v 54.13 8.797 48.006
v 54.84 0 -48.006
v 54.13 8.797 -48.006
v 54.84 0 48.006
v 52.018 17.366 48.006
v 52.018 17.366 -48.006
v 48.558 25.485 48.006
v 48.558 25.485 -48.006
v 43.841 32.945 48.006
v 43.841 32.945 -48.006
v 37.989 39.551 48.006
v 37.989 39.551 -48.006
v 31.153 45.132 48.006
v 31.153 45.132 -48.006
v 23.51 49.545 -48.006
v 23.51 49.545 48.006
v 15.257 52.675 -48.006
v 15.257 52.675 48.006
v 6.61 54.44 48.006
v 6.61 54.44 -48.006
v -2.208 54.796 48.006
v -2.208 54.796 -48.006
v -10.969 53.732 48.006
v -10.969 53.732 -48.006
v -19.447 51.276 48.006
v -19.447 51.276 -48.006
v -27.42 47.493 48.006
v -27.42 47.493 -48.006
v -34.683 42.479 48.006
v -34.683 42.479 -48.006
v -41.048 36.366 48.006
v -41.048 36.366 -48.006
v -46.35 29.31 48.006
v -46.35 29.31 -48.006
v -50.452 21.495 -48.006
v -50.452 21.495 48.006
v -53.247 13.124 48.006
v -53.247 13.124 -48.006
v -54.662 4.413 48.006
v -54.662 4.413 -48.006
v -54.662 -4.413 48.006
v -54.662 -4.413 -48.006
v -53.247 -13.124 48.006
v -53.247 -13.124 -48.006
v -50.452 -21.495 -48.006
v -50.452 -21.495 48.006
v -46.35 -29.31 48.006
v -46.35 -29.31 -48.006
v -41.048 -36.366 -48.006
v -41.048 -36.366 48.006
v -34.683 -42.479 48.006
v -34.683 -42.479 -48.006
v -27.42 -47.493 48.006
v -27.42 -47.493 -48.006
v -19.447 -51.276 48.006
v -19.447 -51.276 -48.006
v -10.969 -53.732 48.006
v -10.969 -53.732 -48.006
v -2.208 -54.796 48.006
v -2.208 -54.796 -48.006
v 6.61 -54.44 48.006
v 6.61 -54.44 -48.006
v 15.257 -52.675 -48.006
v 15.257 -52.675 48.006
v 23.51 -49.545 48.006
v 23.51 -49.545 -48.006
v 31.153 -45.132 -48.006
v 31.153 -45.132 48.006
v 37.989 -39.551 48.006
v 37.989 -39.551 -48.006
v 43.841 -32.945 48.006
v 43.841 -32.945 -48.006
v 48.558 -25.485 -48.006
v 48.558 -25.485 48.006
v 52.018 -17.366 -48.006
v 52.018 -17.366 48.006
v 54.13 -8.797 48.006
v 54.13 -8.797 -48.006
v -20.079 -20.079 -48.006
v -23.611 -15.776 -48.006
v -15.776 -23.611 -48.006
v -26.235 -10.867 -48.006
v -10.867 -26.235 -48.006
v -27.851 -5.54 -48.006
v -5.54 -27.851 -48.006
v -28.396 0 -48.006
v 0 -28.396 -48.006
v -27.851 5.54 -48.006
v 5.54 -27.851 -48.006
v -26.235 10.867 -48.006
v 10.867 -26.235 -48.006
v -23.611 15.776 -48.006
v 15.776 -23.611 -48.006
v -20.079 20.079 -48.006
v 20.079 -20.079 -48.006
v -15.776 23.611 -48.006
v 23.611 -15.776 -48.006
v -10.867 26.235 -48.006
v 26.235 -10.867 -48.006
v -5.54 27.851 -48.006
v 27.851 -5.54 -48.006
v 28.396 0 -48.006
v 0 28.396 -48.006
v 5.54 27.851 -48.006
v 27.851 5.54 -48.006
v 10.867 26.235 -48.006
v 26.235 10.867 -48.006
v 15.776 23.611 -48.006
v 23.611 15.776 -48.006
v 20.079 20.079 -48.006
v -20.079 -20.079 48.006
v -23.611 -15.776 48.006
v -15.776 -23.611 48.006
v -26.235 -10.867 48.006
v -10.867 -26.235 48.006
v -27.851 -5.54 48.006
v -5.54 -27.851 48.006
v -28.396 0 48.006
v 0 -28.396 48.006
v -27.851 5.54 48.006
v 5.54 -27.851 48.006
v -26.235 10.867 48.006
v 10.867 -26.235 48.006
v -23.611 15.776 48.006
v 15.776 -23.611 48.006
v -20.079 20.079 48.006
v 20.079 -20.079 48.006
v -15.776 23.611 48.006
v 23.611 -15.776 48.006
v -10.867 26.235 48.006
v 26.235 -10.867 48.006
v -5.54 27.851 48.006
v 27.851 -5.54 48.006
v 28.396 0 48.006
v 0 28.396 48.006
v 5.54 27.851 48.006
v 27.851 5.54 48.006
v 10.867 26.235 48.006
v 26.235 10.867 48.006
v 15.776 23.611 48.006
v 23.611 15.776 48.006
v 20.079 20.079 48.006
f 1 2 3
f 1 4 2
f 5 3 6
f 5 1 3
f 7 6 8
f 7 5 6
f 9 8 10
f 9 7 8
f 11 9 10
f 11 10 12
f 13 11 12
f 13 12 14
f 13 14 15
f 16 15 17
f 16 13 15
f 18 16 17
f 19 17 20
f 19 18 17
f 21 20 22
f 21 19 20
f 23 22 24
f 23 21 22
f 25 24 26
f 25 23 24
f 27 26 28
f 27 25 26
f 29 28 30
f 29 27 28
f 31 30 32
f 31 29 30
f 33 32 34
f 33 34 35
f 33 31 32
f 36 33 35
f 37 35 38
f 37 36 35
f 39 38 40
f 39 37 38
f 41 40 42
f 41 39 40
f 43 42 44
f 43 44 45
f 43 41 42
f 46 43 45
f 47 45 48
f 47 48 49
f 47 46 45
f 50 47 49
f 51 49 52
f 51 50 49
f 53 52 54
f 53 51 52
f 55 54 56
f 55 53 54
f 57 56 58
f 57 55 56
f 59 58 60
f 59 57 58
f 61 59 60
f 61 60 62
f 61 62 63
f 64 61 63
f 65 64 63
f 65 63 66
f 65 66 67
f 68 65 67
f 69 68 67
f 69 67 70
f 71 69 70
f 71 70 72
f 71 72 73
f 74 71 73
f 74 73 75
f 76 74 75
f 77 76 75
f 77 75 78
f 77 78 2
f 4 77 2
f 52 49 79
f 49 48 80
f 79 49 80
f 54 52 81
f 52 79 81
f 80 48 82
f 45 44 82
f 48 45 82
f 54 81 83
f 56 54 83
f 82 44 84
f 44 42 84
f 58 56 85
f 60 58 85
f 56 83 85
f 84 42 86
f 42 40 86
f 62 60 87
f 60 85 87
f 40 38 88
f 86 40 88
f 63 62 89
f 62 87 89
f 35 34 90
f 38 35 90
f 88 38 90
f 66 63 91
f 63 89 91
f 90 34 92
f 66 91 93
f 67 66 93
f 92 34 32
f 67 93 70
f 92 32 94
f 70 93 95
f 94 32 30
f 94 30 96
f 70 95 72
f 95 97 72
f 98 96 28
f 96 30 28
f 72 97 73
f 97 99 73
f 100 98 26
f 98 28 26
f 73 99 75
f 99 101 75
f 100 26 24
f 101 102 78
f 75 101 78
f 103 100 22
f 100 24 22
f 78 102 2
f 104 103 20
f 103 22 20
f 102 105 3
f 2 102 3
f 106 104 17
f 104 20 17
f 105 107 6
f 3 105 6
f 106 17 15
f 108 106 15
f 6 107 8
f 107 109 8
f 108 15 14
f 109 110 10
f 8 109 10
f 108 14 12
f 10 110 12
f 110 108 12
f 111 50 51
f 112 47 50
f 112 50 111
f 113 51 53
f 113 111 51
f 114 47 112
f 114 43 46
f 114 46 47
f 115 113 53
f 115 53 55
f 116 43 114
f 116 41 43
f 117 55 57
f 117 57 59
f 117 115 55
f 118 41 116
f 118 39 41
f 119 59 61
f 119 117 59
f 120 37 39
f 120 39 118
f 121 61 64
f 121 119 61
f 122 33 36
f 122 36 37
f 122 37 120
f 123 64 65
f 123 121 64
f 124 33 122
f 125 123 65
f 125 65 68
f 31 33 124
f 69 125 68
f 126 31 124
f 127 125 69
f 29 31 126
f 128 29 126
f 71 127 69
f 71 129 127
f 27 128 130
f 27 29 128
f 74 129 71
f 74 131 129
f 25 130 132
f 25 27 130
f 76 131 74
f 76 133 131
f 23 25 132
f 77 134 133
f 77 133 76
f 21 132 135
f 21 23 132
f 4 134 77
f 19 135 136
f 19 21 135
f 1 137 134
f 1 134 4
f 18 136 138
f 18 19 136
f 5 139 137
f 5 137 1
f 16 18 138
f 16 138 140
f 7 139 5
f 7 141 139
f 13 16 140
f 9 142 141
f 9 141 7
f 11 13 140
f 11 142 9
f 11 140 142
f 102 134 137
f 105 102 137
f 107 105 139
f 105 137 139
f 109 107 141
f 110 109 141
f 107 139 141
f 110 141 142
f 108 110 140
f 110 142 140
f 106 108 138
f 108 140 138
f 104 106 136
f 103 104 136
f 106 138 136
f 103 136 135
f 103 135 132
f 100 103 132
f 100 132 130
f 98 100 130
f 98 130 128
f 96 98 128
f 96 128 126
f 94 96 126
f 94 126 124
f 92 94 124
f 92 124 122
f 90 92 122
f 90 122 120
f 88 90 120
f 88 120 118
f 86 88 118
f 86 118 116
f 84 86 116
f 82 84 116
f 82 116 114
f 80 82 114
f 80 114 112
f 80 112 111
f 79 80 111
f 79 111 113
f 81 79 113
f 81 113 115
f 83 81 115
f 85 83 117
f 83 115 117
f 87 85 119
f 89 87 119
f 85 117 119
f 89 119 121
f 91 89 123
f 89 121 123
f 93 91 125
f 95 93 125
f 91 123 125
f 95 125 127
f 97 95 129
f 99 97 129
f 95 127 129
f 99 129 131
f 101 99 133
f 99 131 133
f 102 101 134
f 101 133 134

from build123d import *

# Parameters (mm, degrees)
F0_R     = 54.840067
F1_DEPTH = 48.006
F2_R     = 26.964894
F3_DEPTH = 75.946
F4_R     = 28.396235
F5_DEPTH = 97.028


with BuildPart() as f1:
    # F0 (on Top) → F1 (new body, symmetric)
    with BuildSketch(Plane.XY):
        Circle(F0_R)
    extrude(amount=F1_DEPTH, both=True)

    # F2 (on face) → F3 (join)
    with BuildSketch(Plane.XY.offset(48.006)):
        Circle(F2_R)
    extrude(amount=-F3_DEPTH)

    # F4 (on face) → F5 (cut)
    with BuildSketch(Plane.XY.offset(48.006)):
        Circle(F4_R)
    extrude(amount=-F5_DEPTH, mode=Mode.SUBTRACT)


solid = f1.part
